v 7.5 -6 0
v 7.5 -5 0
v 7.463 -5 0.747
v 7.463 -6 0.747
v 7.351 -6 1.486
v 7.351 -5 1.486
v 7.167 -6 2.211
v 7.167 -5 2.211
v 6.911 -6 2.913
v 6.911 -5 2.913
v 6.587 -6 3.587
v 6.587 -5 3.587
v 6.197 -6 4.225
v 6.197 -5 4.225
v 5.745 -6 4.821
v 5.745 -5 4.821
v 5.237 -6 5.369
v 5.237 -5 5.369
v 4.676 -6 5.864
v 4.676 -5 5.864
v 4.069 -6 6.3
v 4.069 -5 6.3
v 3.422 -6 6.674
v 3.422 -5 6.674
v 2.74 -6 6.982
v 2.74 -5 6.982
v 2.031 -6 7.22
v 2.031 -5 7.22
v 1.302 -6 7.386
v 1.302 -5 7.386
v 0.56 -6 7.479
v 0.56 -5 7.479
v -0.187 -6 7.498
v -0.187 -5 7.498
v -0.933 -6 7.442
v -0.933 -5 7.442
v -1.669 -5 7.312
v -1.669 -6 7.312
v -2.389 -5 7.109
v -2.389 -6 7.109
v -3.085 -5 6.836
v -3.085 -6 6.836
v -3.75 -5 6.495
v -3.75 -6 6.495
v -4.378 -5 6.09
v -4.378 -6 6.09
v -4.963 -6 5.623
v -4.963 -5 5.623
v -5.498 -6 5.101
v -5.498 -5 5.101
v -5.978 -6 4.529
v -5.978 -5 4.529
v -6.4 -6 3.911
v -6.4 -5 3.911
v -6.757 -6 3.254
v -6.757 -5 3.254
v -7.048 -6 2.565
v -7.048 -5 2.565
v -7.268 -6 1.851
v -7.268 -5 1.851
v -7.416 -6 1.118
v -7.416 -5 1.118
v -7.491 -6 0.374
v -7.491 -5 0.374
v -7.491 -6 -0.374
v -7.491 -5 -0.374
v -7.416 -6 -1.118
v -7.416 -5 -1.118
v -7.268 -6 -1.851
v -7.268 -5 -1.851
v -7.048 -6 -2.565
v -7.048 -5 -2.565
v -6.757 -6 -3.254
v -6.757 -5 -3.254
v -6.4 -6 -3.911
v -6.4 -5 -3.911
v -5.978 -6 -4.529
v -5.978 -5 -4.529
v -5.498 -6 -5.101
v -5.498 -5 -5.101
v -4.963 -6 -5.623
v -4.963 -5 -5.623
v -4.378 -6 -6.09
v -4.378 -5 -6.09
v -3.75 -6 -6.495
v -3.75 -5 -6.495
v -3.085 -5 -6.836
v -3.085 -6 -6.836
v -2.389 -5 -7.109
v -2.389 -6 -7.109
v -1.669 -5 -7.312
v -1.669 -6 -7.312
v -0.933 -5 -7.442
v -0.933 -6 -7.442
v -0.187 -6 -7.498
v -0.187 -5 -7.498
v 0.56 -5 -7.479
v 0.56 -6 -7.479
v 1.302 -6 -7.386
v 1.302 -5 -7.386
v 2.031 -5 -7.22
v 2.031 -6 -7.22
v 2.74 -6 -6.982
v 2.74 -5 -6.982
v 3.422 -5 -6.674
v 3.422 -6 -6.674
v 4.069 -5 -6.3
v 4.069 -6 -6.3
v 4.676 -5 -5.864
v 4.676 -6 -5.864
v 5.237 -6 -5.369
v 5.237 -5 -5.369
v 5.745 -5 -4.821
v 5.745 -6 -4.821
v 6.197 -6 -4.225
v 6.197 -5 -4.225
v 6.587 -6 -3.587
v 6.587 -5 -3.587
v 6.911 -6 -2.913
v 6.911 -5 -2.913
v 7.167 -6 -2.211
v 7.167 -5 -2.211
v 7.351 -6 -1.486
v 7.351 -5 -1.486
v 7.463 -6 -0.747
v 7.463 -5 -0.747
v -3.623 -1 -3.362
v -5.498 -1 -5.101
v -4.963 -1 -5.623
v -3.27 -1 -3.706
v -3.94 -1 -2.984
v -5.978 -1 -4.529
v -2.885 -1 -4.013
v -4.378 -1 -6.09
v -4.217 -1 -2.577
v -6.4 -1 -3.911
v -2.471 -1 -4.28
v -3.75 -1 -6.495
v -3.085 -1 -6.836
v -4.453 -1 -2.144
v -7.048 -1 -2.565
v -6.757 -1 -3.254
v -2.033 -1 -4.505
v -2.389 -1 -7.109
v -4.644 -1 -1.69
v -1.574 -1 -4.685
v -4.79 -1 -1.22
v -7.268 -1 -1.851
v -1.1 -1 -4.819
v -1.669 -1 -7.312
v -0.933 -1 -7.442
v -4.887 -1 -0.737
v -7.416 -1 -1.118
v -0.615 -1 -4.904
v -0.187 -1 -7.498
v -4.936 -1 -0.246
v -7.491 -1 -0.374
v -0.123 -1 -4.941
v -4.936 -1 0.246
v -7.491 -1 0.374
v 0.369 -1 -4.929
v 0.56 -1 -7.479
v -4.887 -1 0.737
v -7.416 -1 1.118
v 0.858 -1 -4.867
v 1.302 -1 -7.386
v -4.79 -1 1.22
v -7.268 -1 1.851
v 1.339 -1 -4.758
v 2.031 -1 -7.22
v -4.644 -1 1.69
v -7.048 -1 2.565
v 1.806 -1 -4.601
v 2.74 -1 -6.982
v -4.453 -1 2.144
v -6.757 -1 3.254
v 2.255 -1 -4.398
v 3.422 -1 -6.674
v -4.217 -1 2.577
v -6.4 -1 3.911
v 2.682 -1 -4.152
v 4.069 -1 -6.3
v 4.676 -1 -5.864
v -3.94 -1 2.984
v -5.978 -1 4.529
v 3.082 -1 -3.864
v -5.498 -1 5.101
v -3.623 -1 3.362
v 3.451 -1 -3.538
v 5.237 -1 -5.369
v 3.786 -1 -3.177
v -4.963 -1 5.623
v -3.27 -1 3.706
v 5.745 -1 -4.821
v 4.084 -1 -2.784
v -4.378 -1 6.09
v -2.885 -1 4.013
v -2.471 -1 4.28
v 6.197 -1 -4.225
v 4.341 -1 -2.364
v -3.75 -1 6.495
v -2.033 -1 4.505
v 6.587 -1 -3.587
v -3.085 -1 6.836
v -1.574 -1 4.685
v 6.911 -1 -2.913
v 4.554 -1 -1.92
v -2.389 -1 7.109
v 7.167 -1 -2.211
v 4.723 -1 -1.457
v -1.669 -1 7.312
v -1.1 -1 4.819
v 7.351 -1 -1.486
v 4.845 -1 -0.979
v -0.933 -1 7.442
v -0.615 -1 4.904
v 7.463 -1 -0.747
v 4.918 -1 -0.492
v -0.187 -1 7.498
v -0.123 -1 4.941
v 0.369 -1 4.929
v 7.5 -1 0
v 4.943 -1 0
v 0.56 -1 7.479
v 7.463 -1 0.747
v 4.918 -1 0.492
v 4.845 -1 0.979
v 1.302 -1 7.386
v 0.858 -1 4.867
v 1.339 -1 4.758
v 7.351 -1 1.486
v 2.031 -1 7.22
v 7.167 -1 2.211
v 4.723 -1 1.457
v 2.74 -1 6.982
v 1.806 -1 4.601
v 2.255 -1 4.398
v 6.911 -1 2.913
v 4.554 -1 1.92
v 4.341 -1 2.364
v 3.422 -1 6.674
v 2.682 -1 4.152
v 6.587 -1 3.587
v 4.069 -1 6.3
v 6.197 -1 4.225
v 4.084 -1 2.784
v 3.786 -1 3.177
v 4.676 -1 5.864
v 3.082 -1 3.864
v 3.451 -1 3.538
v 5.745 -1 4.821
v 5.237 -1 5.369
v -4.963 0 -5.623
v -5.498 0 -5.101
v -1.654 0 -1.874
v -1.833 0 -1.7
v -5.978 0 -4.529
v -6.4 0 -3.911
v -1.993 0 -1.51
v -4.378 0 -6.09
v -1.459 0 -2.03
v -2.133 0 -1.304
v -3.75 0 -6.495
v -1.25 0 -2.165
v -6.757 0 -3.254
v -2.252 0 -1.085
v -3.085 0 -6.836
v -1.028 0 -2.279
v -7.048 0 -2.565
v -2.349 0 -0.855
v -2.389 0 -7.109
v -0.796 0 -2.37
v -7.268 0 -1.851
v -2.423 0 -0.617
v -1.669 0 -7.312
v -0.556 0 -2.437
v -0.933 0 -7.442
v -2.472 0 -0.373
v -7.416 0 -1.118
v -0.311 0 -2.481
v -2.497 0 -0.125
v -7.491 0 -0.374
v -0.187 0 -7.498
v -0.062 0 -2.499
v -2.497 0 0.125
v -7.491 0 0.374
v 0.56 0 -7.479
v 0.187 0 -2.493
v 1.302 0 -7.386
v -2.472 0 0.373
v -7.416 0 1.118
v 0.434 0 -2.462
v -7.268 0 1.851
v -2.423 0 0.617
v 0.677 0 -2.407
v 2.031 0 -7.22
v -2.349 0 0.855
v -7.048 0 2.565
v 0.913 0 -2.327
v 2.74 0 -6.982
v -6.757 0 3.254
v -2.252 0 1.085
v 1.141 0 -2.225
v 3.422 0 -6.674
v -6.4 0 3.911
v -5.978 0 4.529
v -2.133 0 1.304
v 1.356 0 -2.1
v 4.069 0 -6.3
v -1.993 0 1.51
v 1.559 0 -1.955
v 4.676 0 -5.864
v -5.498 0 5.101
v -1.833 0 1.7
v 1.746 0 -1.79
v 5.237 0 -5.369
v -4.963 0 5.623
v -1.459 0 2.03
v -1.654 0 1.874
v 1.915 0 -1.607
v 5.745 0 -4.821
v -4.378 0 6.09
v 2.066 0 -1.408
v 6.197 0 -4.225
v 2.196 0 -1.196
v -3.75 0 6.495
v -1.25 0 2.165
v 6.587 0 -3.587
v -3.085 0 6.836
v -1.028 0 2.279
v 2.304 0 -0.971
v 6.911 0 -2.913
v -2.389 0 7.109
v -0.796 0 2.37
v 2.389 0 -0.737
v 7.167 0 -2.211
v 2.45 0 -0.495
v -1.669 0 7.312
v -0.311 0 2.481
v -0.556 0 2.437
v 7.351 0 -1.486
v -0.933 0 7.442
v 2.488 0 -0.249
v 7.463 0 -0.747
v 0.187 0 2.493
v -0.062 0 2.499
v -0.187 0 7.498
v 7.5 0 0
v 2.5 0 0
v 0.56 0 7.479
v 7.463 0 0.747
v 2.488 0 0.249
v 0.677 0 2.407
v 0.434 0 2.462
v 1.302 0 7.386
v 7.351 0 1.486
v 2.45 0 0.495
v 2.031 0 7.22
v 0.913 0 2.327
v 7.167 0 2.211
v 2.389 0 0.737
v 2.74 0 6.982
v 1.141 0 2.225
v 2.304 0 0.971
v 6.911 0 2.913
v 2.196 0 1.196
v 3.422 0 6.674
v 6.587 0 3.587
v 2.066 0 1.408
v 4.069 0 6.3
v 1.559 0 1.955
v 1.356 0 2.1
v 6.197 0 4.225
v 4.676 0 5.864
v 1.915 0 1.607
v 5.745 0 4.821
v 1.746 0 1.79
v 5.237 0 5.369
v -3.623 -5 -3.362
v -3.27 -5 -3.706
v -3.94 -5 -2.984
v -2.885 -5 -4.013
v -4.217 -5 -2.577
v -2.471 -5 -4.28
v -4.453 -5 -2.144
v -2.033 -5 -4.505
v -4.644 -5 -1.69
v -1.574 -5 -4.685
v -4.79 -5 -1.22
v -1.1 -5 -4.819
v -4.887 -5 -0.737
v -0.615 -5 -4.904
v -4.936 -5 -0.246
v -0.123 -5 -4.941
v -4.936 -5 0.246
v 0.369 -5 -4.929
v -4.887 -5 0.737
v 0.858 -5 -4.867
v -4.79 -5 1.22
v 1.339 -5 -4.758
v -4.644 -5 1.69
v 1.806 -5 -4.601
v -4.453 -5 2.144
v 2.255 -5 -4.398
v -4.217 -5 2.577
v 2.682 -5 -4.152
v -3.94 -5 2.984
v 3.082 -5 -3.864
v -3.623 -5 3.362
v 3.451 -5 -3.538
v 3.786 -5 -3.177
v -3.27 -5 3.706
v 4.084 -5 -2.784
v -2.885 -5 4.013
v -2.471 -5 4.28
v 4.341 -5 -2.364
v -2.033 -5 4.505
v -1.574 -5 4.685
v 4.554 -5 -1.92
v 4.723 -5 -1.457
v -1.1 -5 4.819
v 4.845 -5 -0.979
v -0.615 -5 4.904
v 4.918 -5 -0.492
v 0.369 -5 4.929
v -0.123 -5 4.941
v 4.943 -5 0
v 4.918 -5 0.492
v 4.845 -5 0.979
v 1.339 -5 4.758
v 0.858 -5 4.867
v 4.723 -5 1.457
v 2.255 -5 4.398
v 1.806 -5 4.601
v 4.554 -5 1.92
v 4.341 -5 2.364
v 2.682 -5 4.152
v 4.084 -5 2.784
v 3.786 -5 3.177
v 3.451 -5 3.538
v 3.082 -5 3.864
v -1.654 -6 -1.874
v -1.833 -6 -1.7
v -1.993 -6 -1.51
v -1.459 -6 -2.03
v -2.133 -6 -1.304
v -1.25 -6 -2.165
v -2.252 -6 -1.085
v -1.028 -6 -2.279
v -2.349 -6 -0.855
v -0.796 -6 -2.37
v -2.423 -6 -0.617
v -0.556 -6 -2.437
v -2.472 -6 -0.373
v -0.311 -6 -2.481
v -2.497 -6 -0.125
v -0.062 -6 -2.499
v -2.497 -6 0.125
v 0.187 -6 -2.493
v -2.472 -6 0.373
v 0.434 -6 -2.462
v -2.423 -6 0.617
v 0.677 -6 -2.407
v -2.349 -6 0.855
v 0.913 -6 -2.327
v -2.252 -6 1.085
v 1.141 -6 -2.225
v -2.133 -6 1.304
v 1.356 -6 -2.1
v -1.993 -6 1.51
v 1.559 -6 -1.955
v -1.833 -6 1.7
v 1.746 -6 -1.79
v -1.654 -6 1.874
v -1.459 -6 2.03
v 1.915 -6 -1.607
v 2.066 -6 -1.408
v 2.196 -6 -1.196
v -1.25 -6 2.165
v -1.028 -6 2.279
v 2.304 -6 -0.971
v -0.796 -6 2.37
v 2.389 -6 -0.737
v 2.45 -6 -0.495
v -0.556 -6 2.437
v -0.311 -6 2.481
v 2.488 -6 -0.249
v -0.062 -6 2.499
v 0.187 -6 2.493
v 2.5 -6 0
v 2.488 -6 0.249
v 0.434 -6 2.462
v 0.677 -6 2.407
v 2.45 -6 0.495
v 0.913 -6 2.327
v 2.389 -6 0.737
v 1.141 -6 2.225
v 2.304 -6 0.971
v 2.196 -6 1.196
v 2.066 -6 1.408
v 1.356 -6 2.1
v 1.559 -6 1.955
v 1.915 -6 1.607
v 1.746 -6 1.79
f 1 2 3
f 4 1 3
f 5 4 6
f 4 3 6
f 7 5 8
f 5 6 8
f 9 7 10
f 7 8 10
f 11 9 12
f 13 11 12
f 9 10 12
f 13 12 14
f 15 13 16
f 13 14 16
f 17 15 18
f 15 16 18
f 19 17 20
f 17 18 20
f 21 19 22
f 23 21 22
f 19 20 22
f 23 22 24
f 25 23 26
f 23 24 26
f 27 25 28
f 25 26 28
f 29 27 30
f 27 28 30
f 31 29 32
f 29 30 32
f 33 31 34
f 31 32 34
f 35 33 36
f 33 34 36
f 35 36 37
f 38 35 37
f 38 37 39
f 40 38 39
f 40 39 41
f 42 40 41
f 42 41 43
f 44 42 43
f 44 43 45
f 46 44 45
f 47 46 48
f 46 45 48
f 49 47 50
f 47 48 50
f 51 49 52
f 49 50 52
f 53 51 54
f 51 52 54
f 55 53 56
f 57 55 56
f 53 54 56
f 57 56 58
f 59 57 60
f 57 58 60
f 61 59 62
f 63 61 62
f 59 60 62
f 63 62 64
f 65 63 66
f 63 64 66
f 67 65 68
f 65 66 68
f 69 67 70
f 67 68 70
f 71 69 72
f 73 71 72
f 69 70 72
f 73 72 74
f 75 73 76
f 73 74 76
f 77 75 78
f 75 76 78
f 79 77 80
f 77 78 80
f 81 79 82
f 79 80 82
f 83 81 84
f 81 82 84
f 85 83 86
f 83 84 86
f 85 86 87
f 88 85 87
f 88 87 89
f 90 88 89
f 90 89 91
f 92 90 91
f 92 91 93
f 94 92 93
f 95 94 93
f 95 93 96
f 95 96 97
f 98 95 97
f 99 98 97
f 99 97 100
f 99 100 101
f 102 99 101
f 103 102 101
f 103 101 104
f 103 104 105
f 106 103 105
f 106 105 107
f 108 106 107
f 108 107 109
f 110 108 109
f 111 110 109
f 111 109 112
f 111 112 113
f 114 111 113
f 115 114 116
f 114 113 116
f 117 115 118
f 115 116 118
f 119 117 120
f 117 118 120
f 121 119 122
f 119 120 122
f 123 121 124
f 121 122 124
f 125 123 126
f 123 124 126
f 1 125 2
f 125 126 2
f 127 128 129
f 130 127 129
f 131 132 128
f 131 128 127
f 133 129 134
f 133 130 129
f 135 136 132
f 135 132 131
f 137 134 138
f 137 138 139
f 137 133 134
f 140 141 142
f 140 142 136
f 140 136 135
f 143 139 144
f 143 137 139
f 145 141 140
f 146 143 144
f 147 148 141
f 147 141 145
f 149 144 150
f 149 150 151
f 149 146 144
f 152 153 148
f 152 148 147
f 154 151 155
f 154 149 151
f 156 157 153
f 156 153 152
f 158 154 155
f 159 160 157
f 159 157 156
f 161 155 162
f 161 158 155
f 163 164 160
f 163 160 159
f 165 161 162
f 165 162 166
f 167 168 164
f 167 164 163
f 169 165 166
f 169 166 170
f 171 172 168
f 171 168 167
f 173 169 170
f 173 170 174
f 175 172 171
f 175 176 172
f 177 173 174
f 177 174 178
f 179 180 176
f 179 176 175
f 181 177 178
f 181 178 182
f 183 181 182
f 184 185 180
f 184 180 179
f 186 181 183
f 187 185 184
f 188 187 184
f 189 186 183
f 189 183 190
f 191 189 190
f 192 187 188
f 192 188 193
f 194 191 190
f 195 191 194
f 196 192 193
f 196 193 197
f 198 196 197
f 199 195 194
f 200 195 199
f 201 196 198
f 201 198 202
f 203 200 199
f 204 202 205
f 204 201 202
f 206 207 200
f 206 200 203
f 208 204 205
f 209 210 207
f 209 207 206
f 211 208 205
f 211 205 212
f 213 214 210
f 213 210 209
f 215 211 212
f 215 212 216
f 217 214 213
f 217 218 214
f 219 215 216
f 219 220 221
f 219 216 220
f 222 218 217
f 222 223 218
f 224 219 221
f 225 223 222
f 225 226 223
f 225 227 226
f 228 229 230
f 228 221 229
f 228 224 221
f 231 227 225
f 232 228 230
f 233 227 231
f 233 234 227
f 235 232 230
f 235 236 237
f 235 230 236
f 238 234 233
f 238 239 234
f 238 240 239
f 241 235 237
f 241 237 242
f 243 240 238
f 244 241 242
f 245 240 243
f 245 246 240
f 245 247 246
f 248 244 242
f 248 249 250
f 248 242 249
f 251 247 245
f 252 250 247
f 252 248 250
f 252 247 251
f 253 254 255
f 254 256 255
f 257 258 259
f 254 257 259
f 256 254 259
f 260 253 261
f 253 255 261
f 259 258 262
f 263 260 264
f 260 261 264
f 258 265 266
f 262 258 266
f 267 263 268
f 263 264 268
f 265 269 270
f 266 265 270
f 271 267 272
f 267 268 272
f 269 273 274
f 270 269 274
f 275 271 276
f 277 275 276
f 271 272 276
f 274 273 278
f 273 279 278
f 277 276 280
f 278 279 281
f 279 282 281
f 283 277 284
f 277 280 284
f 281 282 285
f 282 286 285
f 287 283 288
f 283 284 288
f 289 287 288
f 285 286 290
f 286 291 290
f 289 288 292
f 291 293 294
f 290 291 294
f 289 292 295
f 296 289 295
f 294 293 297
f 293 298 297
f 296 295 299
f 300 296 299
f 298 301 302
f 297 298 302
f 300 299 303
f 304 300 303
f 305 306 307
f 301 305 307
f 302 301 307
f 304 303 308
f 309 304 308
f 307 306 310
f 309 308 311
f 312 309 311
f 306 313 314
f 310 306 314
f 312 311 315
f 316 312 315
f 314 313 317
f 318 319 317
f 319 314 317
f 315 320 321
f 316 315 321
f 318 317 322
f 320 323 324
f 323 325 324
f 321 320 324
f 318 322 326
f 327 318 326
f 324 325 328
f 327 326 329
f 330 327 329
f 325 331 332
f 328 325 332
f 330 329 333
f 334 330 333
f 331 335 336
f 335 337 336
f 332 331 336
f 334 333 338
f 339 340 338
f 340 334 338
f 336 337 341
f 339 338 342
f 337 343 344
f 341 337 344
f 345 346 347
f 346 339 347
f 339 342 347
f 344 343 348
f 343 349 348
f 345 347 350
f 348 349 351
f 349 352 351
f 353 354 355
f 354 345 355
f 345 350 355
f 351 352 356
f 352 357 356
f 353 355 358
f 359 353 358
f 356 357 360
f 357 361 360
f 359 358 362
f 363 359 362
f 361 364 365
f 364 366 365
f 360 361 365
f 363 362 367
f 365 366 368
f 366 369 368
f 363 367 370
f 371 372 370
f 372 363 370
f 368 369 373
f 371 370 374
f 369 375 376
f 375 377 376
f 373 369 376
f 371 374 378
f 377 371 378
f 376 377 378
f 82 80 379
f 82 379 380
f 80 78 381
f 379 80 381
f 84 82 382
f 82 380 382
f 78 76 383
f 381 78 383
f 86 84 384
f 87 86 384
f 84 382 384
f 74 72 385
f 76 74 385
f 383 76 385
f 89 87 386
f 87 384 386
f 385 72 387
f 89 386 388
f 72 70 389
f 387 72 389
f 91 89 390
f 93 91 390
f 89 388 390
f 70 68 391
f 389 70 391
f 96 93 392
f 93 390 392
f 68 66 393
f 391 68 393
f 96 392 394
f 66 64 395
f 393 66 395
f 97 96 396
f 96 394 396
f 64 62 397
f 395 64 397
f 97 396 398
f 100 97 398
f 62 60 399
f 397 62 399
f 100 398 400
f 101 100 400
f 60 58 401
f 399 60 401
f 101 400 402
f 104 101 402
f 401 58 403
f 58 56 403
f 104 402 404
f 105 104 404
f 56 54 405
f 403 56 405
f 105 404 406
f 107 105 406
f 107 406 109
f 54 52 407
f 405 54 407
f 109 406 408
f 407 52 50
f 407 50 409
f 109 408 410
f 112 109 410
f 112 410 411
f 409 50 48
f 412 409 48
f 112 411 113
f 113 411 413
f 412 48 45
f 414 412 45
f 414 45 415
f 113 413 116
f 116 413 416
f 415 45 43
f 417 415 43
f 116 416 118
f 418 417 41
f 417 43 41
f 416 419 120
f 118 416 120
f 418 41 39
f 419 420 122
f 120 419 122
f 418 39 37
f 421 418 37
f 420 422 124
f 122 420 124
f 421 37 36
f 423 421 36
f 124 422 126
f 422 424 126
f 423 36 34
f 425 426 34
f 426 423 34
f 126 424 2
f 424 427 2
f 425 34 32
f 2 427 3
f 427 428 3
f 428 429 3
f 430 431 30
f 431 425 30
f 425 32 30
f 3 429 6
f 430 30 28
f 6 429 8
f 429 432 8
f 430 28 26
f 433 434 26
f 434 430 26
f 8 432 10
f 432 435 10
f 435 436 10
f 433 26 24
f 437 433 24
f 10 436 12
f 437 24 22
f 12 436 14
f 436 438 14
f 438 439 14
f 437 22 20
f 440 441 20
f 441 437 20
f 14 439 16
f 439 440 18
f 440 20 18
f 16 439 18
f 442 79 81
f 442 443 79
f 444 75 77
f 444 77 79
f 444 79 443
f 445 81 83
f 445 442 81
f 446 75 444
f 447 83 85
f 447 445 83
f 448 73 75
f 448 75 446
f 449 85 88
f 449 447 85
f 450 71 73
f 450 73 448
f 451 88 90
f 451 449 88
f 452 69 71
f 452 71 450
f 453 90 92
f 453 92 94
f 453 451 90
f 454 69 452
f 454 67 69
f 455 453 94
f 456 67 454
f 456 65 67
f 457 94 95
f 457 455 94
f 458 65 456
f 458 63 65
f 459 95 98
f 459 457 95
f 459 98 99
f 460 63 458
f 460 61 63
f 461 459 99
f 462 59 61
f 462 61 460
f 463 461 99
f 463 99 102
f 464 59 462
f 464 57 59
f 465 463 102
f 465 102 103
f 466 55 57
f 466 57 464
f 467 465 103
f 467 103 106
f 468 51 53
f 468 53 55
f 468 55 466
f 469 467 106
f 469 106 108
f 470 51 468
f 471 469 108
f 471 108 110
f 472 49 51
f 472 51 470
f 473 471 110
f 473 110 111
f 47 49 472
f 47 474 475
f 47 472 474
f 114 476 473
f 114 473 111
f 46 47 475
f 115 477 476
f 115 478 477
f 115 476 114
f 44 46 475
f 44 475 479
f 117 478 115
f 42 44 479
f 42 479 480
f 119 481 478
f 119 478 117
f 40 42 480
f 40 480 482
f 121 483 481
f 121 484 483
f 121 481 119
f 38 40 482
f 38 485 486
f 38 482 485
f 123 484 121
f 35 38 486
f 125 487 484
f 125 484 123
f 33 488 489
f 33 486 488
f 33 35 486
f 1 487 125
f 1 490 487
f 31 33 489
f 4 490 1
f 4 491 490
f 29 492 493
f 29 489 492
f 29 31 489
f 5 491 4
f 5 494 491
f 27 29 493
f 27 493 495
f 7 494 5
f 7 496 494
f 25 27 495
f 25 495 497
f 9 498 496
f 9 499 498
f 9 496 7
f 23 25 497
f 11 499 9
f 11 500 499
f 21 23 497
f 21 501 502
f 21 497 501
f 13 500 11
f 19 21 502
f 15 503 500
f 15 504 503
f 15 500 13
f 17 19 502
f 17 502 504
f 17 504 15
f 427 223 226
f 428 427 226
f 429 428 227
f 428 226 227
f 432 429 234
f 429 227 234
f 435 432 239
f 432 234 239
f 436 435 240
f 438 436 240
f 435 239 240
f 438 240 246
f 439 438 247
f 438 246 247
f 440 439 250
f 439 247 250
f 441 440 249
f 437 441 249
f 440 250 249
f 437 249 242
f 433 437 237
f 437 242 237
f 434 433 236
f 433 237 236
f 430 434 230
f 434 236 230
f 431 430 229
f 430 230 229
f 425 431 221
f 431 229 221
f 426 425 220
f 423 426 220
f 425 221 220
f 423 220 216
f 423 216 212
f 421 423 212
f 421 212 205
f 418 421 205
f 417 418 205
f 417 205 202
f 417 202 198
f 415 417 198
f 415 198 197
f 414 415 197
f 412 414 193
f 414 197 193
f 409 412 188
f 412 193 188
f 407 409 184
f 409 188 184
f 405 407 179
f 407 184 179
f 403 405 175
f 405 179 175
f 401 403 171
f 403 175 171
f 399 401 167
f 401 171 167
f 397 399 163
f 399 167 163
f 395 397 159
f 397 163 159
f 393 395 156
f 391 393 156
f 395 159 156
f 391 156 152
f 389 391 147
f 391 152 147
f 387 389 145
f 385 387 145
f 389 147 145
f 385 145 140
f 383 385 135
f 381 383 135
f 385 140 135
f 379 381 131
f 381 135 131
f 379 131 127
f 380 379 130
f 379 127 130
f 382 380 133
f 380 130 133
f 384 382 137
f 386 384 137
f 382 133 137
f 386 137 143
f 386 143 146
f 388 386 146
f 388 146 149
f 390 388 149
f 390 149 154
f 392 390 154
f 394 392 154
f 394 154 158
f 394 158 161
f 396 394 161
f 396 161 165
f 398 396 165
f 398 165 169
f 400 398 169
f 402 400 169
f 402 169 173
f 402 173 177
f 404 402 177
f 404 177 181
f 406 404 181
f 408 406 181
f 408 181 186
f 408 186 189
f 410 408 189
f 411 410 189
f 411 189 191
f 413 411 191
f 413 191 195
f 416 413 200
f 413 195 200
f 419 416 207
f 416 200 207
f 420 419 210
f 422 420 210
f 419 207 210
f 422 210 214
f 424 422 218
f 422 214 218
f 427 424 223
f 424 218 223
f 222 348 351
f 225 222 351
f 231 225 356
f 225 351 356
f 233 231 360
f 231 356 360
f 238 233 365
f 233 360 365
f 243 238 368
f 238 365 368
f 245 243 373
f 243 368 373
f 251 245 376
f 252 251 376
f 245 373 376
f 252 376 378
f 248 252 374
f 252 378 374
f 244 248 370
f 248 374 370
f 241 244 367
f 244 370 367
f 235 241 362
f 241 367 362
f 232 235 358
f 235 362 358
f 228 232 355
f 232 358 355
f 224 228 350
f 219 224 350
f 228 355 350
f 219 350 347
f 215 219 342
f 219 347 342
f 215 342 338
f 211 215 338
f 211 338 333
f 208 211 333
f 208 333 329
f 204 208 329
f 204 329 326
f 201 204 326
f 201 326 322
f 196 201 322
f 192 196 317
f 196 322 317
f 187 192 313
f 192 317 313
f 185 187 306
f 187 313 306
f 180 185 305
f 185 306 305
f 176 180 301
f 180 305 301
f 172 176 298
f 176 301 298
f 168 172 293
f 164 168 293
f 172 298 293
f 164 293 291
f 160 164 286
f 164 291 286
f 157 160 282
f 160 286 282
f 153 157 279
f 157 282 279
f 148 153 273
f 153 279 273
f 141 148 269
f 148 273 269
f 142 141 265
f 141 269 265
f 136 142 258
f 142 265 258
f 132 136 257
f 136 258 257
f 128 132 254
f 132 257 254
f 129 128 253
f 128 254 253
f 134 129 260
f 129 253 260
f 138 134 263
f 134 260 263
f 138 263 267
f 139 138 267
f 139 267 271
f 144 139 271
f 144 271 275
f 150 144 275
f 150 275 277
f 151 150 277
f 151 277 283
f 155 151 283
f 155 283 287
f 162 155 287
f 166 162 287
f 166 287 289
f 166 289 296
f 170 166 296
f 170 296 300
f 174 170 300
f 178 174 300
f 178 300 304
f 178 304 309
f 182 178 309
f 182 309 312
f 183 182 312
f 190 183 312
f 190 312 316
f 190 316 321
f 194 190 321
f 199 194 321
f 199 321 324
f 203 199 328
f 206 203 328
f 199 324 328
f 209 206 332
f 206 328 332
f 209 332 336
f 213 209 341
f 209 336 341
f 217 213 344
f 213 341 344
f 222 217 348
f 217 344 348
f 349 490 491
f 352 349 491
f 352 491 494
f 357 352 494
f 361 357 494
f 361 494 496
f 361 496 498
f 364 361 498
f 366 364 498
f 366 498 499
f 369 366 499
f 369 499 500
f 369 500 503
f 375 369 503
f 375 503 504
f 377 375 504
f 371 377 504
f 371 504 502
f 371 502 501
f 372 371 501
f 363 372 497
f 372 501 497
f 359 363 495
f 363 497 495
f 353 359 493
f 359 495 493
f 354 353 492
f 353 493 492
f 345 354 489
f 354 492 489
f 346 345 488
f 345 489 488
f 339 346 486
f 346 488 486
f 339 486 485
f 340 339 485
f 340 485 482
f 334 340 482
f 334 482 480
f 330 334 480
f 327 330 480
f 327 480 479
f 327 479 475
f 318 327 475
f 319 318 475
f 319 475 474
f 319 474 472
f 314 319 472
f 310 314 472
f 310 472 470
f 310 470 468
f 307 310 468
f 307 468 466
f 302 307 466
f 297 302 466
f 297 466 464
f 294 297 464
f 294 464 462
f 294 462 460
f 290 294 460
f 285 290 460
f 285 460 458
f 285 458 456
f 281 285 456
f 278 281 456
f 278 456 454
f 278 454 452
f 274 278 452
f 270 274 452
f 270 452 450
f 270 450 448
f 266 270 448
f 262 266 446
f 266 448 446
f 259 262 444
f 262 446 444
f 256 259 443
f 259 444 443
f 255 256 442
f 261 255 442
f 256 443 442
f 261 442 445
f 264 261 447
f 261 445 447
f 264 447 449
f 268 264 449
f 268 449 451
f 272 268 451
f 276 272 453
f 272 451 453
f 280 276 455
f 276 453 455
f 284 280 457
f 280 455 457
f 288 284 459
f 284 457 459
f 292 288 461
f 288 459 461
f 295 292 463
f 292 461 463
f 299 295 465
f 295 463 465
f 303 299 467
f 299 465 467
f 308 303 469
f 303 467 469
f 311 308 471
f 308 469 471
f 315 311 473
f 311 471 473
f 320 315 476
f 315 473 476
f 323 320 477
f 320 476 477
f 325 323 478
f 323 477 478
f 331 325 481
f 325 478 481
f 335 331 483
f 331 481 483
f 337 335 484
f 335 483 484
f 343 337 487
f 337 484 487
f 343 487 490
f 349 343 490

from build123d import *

# Parameters (mm, degrees)
F0_R     = 7.5
F1_DEPTH = 1
F2_R     = 4.942542
F3_DEPTH = 4
F4_R     = 7.5
F5_DEPTH = 1
F6_R     = 2.5
F7_DEPTH = 25


with BuildPart() as f1:
    # F0 (on Front) → F1 (new body)
    with BuildSketch(Plane.XZ):
        Circle(F0_R)
    extrude(amount=F1_DEPTH)

    # F2 (on face) → F3 (join)
    with BuildSketch(Plane.XZ.offset(1)):
        Circle(F2_R)
    extrude(amount=F3_DEPTH)

    # F4 (on face) → F5 (join)
    with BuildSketch(Plane.XZ.offset(5)):
        Circle(F4_R)
    extrude(amount=F5_DEPTH)

    # F6 (on face) → F7 (cut)
    with BuildSketch(Plane.XZ.offset(6)):
        Circle(F6_R)
    extrude(amount=-F7_DEPTH, mode=Mode.SUBTRACT)


solid = f1.part
